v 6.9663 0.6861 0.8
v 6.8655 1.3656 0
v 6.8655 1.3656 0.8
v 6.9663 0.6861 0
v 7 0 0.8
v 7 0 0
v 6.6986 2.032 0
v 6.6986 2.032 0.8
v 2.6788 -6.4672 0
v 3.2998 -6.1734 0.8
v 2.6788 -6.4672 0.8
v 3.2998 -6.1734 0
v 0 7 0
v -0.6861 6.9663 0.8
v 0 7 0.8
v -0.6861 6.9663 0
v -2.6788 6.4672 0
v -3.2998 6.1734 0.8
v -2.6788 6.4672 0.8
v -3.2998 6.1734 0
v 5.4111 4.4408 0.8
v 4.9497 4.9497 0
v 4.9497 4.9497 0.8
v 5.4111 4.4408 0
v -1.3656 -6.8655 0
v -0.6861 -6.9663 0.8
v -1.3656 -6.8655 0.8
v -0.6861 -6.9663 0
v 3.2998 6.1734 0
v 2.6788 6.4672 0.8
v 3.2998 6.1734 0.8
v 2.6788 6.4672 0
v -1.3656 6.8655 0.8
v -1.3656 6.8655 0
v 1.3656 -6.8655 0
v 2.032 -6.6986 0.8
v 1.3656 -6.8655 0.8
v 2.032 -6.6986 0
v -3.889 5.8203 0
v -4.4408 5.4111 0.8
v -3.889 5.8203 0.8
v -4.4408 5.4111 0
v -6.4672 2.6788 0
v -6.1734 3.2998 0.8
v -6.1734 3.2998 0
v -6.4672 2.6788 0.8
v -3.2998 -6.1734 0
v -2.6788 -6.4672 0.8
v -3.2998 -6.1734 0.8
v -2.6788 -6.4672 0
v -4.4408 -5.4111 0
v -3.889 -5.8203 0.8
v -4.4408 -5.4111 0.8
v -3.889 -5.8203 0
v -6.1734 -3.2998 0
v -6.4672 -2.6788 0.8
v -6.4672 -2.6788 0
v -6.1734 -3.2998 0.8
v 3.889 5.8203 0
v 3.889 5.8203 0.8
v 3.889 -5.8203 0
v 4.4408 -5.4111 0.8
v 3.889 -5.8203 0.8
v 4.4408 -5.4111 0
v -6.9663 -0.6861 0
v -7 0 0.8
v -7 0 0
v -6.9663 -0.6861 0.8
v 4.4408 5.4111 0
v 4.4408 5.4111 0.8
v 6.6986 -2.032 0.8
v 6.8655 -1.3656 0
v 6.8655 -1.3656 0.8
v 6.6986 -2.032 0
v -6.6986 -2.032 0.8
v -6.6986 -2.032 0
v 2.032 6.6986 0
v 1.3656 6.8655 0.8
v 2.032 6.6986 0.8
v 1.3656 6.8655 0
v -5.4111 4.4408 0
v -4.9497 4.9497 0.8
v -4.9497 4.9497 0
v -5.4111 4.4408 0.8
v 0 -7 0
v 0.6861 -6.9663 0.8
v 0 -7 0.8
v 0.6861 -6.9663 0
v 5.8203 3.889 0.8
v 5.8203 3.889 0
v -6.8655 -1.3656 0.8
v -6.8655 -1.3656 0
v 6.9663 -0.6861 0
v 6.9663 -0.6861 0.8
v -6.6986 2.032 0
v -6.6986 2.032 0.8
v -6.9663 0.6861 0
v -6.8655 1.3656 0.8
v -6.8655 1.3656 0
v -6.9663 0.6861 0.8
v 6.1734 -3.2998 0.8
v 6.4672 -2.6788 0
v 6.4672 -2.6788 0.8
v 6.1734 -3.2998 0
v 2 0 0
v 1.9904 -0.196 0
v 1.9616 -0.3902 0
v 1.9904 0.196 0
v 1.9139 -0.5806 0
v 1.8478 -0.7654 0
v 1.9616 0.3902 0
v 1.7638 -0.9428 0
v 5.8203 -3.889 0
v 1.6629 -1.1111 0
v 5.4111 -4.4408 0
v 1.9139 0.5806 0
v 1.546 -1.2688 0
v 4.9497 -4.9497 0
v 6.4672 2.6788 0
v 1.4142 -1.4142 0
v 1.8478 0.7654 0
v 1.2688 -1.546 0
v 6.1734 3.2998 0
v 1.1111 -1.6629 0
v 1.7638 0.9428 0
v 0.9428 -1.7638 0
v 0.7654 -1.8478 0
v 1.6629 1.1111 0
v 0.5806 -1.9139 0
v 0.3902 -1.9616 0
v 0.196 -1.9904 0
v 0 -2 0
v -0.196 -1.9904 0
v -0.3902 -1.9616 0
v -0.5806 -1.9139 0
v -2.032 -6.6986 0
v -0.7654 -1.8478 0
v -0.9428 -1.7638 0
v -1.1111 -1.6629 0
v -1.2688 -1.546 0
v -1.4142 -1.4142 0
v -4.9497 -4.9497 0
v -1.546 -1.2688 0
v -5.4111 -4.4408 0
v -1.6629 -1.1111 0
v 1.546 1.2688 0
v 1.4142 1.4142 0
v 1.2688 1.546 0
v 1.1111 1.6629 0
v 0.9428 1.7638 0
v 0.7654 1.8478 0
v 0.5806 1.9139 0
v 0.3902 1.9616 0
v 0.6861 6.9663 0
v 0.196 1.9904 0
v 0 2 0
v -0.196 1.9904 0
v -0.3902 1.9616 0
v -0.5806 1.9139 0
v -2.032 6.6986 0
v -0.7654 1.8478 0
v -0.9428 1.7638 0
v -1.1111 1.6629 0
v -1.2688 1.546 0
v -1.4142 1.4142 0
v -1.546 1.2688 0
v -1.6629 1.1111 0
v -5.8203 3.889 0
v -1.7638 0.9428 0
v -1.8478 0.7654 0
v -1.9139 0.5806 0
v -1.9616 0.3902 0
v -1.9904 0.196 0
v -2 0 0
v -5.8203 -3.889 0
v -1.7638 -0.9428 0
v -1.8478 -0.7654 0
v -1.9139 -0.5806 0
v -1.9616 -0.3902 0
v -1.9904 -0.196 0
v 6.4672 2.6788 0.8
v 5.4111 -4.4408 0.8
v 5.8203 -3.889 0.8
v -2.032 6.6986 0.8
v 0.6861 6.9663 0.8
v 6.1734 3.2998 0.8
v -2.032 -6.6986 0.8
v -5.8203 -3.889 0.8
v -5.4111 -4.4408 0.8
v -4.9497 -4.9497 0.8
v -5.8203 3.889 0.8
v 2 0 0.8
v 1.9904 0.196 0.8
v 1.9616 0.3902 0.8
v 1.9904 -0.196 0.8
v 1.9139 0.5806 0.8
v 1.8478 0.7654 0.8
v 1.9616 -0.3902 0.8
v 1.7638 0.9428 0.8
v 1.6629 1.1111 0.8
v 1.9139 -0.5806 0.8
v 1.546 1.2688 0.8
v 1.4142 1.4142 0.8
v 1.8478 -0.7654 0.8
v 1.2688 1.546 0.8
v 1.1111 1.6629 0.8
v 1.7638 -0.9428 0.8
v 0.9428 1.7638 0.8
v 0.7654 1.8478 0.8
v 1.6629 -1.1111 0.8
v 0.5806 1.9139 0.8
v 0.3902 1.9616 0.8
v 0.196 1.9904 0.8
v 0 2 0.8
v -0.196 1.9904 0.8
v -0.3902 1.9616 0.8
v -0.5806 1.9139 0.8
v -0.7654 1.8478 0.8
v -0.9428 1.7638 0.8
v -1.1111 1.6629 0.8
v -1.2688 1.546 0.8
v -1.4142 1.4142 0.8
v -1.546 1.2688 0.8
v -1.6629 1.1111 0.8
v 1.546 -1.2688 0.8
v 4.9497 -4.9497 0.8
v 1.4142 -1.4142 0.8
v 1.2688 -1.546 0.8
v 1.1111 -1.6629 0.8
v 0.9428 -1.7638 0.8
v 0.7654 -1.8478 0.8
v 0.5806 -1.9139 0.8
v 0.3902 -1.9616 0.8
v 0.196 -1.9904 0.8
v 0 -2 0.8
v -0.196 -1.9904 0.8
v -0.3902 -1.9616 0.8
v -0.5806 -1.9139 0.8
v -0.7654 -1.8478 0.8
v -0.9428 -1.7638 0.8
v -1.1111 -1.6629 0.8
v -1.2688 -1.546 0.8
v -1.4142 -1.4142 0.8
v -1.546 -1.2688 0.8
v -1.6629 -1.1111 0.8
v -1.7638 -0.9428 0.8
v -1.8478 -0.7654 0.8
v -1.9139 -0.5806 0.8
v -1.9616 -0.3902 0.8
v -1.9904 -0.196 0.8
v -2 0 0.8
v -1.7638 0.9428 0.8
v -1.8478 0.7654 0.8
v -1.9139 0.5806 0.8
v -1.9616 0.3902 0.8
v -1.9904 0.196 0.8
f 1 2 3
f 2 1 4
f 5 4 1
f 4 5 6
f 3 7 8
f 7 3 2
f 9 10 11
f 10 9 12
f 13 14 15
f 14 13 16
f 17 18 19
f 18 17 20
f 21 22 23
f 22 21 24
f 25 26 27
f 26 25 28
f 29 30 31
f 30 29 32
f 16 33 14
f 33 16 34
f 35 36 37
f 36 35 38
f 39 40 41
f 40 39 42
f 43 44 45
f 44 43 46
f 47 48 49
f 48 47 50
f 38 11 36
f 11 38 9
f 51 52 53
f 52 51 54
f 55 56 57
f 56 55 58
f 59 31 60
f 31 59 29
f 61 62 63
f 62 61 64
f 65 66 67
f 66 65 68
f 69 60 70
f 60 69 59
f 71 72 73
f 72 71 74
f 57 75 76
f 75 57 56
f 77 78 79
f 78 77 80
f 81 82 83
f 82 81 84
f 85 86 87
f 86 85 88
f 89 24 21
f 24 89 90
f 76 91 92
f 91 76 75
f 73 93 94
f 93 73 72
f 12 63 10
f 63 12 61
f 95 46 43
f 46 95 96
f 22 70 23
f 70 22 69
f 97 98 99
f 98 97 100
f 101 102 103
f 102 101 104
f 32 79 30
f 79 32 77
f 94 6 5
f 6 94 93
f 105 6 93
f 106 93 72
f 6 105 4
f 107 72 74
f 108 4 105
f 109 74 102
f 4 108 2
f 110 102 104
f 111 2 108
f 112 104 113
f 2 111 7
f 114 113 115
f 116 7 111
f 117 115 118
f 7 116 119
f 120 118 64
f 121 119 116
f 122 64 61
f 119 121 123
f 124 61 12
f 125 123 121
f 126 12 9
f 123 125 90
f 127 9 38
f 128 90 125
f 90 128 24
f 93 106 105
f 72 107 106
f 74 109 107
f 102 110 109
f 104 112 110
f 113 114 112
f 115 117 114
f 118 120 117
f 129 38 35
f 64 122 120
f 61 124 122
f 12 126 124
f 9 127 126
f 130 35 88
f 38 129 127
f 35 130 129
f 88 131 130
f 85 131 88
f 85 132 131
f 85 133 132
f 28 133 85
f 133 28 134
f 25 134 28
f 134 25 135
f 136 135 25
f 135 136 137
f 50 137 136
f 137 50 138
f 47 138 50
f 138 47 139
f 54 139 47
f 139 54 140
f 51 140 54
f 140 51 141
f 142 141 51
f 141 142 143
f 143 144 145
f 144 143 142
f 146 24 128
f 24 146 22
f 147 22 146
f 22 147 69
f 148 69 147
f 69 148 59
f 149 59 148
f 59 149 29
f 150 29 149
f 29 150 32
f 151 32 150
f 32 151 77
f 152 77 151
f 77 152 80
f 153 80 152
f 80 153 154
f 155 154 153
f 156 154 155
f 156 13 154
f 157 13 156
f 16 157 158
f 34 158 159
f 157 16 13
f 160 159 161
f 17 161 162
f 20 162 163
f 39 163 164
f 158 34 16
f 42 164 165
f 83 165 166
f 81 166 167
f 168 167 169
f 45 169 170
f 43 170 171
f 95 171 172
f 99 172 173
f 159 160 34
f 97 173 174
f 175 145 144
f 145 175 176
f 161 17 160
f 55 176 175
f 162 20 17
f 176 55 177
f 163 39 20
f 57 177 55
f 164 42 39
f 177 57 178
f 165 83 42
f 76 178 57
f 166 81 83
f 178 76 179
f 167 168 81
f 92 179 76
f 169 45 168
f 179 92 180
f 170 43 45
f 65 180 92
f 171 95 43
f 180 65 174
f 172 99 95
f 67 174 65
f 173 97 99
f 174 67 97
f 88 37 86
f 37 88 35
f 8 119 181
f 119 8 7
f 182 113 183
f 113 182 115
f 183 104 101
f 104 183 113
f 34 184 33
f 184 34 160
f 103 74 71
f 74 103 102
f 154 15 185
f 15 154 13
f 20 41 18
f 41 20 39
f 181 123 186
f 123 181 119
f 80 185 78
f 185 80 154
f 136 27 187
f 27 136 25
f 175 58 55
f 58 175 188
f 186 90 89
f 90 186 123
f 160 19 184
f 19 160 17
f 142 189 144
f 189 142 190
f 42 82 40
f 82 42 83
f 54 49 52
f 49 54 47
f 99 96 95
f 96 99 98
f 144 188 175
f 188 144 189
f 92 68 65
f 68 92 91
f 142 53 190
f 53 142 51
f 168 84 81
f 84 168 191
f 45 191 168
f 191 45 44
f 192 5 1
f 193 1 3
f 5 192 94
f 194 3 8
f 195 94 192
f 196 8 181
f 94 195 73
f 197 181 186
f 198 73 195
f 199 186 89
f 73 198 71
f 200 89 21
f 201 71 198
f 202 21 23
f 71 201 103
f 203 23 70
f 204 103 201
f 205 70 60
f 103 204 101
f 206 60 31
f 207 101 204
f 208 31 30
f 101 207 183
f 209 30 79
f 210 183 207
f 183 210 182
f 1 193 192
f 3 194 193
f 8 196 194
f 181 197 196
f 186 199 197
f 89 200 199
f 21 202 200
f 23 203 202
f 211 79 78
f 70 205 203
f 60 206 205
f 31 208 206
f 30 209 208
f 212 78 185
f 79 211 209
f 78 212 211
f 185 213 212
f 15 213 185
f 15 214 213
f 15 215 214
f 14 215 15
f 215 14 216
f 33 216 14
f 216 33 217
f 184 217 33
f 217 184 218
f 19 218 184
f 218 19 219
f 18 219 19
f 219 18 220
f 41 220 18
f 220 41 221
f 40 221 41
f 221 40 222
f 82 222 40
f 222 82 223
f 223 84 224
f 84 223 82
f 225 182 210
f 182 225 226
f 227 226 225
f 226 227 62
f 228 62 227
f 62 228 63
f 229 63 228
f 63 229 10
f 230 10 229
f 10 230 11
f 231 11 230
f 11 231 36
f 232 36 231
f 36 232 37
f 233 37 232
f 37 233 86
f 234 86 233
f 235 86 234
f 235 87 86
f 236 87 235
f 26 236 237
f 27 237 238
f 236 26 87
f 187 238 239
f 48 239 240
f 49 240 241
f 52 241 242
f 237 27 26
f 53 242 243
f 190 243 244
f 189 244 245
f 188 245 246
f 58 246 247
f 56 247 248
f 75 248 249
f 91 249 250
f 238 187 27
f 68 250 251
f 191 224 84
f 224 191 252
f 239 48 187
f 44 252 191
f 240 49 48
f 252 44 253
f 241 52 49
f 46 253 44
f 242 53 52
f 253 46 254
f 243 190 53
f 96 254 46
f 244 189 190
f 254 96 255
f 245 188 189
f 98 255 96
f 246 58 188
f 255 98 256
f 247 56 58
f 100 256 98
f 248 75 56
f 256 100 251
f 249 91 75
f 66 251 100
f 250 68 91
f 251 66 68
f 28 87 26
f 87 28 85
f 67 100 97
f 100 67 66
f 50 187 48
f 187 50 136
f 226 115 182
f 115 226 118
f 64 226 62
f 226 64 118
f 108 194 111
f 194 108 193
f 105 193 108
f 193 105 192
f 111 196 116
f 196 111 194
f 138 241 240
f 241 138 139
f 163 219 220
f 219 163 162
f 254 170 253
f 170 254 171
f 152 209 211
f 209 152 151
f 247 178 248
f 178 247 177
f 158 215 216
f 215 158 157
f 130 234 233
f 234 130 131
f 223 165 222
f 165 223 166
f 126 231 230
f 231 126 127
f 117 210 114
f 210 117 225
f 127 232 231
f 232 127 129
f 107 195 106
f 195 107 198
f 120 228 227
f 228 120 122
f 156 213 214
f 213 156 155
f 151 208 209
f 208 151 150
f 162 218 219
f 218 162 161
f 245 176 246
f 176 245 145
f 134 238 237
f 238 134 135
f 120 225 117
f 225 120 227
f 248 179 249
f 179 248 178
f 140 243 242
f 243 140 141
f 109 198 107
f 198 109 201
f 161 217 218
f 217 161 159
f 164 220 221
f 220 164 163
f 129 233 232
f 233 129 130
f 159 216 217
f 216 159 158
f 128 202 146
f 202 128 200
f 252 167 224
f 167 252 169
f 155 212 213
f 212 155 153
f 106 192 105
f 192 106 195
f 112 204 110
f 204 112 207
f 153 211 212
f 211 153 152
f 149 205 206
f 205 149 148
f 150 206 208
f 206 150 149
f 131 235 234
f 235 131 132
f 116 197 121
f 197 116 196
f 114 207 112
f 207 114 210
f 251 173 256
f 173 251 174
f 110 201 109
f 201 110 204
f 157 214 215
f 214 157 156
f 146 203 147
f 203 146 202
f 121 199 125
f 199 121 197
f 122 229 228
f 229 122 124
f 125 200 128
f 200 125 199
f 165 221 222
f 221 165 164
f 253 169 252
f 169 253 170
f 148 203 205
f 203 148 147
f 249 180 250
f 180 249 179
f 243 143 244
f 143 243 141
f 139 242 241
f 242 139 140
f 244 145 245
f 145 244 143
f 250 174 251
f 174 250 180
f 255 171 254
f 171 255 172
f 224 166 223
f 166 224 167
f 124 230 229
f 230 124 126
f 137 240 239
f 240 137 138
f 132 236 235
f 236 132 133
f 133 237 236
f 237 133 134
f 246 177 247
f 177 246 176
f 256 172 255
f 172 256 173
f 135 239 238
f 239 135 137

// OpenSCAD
difference() {
    cylinder(h=0.8, d=14.0, $fn=64);
    translate([0, 0, -0.1])
        cylinder(h=1.0, d=4.0, $fn=64);
}
